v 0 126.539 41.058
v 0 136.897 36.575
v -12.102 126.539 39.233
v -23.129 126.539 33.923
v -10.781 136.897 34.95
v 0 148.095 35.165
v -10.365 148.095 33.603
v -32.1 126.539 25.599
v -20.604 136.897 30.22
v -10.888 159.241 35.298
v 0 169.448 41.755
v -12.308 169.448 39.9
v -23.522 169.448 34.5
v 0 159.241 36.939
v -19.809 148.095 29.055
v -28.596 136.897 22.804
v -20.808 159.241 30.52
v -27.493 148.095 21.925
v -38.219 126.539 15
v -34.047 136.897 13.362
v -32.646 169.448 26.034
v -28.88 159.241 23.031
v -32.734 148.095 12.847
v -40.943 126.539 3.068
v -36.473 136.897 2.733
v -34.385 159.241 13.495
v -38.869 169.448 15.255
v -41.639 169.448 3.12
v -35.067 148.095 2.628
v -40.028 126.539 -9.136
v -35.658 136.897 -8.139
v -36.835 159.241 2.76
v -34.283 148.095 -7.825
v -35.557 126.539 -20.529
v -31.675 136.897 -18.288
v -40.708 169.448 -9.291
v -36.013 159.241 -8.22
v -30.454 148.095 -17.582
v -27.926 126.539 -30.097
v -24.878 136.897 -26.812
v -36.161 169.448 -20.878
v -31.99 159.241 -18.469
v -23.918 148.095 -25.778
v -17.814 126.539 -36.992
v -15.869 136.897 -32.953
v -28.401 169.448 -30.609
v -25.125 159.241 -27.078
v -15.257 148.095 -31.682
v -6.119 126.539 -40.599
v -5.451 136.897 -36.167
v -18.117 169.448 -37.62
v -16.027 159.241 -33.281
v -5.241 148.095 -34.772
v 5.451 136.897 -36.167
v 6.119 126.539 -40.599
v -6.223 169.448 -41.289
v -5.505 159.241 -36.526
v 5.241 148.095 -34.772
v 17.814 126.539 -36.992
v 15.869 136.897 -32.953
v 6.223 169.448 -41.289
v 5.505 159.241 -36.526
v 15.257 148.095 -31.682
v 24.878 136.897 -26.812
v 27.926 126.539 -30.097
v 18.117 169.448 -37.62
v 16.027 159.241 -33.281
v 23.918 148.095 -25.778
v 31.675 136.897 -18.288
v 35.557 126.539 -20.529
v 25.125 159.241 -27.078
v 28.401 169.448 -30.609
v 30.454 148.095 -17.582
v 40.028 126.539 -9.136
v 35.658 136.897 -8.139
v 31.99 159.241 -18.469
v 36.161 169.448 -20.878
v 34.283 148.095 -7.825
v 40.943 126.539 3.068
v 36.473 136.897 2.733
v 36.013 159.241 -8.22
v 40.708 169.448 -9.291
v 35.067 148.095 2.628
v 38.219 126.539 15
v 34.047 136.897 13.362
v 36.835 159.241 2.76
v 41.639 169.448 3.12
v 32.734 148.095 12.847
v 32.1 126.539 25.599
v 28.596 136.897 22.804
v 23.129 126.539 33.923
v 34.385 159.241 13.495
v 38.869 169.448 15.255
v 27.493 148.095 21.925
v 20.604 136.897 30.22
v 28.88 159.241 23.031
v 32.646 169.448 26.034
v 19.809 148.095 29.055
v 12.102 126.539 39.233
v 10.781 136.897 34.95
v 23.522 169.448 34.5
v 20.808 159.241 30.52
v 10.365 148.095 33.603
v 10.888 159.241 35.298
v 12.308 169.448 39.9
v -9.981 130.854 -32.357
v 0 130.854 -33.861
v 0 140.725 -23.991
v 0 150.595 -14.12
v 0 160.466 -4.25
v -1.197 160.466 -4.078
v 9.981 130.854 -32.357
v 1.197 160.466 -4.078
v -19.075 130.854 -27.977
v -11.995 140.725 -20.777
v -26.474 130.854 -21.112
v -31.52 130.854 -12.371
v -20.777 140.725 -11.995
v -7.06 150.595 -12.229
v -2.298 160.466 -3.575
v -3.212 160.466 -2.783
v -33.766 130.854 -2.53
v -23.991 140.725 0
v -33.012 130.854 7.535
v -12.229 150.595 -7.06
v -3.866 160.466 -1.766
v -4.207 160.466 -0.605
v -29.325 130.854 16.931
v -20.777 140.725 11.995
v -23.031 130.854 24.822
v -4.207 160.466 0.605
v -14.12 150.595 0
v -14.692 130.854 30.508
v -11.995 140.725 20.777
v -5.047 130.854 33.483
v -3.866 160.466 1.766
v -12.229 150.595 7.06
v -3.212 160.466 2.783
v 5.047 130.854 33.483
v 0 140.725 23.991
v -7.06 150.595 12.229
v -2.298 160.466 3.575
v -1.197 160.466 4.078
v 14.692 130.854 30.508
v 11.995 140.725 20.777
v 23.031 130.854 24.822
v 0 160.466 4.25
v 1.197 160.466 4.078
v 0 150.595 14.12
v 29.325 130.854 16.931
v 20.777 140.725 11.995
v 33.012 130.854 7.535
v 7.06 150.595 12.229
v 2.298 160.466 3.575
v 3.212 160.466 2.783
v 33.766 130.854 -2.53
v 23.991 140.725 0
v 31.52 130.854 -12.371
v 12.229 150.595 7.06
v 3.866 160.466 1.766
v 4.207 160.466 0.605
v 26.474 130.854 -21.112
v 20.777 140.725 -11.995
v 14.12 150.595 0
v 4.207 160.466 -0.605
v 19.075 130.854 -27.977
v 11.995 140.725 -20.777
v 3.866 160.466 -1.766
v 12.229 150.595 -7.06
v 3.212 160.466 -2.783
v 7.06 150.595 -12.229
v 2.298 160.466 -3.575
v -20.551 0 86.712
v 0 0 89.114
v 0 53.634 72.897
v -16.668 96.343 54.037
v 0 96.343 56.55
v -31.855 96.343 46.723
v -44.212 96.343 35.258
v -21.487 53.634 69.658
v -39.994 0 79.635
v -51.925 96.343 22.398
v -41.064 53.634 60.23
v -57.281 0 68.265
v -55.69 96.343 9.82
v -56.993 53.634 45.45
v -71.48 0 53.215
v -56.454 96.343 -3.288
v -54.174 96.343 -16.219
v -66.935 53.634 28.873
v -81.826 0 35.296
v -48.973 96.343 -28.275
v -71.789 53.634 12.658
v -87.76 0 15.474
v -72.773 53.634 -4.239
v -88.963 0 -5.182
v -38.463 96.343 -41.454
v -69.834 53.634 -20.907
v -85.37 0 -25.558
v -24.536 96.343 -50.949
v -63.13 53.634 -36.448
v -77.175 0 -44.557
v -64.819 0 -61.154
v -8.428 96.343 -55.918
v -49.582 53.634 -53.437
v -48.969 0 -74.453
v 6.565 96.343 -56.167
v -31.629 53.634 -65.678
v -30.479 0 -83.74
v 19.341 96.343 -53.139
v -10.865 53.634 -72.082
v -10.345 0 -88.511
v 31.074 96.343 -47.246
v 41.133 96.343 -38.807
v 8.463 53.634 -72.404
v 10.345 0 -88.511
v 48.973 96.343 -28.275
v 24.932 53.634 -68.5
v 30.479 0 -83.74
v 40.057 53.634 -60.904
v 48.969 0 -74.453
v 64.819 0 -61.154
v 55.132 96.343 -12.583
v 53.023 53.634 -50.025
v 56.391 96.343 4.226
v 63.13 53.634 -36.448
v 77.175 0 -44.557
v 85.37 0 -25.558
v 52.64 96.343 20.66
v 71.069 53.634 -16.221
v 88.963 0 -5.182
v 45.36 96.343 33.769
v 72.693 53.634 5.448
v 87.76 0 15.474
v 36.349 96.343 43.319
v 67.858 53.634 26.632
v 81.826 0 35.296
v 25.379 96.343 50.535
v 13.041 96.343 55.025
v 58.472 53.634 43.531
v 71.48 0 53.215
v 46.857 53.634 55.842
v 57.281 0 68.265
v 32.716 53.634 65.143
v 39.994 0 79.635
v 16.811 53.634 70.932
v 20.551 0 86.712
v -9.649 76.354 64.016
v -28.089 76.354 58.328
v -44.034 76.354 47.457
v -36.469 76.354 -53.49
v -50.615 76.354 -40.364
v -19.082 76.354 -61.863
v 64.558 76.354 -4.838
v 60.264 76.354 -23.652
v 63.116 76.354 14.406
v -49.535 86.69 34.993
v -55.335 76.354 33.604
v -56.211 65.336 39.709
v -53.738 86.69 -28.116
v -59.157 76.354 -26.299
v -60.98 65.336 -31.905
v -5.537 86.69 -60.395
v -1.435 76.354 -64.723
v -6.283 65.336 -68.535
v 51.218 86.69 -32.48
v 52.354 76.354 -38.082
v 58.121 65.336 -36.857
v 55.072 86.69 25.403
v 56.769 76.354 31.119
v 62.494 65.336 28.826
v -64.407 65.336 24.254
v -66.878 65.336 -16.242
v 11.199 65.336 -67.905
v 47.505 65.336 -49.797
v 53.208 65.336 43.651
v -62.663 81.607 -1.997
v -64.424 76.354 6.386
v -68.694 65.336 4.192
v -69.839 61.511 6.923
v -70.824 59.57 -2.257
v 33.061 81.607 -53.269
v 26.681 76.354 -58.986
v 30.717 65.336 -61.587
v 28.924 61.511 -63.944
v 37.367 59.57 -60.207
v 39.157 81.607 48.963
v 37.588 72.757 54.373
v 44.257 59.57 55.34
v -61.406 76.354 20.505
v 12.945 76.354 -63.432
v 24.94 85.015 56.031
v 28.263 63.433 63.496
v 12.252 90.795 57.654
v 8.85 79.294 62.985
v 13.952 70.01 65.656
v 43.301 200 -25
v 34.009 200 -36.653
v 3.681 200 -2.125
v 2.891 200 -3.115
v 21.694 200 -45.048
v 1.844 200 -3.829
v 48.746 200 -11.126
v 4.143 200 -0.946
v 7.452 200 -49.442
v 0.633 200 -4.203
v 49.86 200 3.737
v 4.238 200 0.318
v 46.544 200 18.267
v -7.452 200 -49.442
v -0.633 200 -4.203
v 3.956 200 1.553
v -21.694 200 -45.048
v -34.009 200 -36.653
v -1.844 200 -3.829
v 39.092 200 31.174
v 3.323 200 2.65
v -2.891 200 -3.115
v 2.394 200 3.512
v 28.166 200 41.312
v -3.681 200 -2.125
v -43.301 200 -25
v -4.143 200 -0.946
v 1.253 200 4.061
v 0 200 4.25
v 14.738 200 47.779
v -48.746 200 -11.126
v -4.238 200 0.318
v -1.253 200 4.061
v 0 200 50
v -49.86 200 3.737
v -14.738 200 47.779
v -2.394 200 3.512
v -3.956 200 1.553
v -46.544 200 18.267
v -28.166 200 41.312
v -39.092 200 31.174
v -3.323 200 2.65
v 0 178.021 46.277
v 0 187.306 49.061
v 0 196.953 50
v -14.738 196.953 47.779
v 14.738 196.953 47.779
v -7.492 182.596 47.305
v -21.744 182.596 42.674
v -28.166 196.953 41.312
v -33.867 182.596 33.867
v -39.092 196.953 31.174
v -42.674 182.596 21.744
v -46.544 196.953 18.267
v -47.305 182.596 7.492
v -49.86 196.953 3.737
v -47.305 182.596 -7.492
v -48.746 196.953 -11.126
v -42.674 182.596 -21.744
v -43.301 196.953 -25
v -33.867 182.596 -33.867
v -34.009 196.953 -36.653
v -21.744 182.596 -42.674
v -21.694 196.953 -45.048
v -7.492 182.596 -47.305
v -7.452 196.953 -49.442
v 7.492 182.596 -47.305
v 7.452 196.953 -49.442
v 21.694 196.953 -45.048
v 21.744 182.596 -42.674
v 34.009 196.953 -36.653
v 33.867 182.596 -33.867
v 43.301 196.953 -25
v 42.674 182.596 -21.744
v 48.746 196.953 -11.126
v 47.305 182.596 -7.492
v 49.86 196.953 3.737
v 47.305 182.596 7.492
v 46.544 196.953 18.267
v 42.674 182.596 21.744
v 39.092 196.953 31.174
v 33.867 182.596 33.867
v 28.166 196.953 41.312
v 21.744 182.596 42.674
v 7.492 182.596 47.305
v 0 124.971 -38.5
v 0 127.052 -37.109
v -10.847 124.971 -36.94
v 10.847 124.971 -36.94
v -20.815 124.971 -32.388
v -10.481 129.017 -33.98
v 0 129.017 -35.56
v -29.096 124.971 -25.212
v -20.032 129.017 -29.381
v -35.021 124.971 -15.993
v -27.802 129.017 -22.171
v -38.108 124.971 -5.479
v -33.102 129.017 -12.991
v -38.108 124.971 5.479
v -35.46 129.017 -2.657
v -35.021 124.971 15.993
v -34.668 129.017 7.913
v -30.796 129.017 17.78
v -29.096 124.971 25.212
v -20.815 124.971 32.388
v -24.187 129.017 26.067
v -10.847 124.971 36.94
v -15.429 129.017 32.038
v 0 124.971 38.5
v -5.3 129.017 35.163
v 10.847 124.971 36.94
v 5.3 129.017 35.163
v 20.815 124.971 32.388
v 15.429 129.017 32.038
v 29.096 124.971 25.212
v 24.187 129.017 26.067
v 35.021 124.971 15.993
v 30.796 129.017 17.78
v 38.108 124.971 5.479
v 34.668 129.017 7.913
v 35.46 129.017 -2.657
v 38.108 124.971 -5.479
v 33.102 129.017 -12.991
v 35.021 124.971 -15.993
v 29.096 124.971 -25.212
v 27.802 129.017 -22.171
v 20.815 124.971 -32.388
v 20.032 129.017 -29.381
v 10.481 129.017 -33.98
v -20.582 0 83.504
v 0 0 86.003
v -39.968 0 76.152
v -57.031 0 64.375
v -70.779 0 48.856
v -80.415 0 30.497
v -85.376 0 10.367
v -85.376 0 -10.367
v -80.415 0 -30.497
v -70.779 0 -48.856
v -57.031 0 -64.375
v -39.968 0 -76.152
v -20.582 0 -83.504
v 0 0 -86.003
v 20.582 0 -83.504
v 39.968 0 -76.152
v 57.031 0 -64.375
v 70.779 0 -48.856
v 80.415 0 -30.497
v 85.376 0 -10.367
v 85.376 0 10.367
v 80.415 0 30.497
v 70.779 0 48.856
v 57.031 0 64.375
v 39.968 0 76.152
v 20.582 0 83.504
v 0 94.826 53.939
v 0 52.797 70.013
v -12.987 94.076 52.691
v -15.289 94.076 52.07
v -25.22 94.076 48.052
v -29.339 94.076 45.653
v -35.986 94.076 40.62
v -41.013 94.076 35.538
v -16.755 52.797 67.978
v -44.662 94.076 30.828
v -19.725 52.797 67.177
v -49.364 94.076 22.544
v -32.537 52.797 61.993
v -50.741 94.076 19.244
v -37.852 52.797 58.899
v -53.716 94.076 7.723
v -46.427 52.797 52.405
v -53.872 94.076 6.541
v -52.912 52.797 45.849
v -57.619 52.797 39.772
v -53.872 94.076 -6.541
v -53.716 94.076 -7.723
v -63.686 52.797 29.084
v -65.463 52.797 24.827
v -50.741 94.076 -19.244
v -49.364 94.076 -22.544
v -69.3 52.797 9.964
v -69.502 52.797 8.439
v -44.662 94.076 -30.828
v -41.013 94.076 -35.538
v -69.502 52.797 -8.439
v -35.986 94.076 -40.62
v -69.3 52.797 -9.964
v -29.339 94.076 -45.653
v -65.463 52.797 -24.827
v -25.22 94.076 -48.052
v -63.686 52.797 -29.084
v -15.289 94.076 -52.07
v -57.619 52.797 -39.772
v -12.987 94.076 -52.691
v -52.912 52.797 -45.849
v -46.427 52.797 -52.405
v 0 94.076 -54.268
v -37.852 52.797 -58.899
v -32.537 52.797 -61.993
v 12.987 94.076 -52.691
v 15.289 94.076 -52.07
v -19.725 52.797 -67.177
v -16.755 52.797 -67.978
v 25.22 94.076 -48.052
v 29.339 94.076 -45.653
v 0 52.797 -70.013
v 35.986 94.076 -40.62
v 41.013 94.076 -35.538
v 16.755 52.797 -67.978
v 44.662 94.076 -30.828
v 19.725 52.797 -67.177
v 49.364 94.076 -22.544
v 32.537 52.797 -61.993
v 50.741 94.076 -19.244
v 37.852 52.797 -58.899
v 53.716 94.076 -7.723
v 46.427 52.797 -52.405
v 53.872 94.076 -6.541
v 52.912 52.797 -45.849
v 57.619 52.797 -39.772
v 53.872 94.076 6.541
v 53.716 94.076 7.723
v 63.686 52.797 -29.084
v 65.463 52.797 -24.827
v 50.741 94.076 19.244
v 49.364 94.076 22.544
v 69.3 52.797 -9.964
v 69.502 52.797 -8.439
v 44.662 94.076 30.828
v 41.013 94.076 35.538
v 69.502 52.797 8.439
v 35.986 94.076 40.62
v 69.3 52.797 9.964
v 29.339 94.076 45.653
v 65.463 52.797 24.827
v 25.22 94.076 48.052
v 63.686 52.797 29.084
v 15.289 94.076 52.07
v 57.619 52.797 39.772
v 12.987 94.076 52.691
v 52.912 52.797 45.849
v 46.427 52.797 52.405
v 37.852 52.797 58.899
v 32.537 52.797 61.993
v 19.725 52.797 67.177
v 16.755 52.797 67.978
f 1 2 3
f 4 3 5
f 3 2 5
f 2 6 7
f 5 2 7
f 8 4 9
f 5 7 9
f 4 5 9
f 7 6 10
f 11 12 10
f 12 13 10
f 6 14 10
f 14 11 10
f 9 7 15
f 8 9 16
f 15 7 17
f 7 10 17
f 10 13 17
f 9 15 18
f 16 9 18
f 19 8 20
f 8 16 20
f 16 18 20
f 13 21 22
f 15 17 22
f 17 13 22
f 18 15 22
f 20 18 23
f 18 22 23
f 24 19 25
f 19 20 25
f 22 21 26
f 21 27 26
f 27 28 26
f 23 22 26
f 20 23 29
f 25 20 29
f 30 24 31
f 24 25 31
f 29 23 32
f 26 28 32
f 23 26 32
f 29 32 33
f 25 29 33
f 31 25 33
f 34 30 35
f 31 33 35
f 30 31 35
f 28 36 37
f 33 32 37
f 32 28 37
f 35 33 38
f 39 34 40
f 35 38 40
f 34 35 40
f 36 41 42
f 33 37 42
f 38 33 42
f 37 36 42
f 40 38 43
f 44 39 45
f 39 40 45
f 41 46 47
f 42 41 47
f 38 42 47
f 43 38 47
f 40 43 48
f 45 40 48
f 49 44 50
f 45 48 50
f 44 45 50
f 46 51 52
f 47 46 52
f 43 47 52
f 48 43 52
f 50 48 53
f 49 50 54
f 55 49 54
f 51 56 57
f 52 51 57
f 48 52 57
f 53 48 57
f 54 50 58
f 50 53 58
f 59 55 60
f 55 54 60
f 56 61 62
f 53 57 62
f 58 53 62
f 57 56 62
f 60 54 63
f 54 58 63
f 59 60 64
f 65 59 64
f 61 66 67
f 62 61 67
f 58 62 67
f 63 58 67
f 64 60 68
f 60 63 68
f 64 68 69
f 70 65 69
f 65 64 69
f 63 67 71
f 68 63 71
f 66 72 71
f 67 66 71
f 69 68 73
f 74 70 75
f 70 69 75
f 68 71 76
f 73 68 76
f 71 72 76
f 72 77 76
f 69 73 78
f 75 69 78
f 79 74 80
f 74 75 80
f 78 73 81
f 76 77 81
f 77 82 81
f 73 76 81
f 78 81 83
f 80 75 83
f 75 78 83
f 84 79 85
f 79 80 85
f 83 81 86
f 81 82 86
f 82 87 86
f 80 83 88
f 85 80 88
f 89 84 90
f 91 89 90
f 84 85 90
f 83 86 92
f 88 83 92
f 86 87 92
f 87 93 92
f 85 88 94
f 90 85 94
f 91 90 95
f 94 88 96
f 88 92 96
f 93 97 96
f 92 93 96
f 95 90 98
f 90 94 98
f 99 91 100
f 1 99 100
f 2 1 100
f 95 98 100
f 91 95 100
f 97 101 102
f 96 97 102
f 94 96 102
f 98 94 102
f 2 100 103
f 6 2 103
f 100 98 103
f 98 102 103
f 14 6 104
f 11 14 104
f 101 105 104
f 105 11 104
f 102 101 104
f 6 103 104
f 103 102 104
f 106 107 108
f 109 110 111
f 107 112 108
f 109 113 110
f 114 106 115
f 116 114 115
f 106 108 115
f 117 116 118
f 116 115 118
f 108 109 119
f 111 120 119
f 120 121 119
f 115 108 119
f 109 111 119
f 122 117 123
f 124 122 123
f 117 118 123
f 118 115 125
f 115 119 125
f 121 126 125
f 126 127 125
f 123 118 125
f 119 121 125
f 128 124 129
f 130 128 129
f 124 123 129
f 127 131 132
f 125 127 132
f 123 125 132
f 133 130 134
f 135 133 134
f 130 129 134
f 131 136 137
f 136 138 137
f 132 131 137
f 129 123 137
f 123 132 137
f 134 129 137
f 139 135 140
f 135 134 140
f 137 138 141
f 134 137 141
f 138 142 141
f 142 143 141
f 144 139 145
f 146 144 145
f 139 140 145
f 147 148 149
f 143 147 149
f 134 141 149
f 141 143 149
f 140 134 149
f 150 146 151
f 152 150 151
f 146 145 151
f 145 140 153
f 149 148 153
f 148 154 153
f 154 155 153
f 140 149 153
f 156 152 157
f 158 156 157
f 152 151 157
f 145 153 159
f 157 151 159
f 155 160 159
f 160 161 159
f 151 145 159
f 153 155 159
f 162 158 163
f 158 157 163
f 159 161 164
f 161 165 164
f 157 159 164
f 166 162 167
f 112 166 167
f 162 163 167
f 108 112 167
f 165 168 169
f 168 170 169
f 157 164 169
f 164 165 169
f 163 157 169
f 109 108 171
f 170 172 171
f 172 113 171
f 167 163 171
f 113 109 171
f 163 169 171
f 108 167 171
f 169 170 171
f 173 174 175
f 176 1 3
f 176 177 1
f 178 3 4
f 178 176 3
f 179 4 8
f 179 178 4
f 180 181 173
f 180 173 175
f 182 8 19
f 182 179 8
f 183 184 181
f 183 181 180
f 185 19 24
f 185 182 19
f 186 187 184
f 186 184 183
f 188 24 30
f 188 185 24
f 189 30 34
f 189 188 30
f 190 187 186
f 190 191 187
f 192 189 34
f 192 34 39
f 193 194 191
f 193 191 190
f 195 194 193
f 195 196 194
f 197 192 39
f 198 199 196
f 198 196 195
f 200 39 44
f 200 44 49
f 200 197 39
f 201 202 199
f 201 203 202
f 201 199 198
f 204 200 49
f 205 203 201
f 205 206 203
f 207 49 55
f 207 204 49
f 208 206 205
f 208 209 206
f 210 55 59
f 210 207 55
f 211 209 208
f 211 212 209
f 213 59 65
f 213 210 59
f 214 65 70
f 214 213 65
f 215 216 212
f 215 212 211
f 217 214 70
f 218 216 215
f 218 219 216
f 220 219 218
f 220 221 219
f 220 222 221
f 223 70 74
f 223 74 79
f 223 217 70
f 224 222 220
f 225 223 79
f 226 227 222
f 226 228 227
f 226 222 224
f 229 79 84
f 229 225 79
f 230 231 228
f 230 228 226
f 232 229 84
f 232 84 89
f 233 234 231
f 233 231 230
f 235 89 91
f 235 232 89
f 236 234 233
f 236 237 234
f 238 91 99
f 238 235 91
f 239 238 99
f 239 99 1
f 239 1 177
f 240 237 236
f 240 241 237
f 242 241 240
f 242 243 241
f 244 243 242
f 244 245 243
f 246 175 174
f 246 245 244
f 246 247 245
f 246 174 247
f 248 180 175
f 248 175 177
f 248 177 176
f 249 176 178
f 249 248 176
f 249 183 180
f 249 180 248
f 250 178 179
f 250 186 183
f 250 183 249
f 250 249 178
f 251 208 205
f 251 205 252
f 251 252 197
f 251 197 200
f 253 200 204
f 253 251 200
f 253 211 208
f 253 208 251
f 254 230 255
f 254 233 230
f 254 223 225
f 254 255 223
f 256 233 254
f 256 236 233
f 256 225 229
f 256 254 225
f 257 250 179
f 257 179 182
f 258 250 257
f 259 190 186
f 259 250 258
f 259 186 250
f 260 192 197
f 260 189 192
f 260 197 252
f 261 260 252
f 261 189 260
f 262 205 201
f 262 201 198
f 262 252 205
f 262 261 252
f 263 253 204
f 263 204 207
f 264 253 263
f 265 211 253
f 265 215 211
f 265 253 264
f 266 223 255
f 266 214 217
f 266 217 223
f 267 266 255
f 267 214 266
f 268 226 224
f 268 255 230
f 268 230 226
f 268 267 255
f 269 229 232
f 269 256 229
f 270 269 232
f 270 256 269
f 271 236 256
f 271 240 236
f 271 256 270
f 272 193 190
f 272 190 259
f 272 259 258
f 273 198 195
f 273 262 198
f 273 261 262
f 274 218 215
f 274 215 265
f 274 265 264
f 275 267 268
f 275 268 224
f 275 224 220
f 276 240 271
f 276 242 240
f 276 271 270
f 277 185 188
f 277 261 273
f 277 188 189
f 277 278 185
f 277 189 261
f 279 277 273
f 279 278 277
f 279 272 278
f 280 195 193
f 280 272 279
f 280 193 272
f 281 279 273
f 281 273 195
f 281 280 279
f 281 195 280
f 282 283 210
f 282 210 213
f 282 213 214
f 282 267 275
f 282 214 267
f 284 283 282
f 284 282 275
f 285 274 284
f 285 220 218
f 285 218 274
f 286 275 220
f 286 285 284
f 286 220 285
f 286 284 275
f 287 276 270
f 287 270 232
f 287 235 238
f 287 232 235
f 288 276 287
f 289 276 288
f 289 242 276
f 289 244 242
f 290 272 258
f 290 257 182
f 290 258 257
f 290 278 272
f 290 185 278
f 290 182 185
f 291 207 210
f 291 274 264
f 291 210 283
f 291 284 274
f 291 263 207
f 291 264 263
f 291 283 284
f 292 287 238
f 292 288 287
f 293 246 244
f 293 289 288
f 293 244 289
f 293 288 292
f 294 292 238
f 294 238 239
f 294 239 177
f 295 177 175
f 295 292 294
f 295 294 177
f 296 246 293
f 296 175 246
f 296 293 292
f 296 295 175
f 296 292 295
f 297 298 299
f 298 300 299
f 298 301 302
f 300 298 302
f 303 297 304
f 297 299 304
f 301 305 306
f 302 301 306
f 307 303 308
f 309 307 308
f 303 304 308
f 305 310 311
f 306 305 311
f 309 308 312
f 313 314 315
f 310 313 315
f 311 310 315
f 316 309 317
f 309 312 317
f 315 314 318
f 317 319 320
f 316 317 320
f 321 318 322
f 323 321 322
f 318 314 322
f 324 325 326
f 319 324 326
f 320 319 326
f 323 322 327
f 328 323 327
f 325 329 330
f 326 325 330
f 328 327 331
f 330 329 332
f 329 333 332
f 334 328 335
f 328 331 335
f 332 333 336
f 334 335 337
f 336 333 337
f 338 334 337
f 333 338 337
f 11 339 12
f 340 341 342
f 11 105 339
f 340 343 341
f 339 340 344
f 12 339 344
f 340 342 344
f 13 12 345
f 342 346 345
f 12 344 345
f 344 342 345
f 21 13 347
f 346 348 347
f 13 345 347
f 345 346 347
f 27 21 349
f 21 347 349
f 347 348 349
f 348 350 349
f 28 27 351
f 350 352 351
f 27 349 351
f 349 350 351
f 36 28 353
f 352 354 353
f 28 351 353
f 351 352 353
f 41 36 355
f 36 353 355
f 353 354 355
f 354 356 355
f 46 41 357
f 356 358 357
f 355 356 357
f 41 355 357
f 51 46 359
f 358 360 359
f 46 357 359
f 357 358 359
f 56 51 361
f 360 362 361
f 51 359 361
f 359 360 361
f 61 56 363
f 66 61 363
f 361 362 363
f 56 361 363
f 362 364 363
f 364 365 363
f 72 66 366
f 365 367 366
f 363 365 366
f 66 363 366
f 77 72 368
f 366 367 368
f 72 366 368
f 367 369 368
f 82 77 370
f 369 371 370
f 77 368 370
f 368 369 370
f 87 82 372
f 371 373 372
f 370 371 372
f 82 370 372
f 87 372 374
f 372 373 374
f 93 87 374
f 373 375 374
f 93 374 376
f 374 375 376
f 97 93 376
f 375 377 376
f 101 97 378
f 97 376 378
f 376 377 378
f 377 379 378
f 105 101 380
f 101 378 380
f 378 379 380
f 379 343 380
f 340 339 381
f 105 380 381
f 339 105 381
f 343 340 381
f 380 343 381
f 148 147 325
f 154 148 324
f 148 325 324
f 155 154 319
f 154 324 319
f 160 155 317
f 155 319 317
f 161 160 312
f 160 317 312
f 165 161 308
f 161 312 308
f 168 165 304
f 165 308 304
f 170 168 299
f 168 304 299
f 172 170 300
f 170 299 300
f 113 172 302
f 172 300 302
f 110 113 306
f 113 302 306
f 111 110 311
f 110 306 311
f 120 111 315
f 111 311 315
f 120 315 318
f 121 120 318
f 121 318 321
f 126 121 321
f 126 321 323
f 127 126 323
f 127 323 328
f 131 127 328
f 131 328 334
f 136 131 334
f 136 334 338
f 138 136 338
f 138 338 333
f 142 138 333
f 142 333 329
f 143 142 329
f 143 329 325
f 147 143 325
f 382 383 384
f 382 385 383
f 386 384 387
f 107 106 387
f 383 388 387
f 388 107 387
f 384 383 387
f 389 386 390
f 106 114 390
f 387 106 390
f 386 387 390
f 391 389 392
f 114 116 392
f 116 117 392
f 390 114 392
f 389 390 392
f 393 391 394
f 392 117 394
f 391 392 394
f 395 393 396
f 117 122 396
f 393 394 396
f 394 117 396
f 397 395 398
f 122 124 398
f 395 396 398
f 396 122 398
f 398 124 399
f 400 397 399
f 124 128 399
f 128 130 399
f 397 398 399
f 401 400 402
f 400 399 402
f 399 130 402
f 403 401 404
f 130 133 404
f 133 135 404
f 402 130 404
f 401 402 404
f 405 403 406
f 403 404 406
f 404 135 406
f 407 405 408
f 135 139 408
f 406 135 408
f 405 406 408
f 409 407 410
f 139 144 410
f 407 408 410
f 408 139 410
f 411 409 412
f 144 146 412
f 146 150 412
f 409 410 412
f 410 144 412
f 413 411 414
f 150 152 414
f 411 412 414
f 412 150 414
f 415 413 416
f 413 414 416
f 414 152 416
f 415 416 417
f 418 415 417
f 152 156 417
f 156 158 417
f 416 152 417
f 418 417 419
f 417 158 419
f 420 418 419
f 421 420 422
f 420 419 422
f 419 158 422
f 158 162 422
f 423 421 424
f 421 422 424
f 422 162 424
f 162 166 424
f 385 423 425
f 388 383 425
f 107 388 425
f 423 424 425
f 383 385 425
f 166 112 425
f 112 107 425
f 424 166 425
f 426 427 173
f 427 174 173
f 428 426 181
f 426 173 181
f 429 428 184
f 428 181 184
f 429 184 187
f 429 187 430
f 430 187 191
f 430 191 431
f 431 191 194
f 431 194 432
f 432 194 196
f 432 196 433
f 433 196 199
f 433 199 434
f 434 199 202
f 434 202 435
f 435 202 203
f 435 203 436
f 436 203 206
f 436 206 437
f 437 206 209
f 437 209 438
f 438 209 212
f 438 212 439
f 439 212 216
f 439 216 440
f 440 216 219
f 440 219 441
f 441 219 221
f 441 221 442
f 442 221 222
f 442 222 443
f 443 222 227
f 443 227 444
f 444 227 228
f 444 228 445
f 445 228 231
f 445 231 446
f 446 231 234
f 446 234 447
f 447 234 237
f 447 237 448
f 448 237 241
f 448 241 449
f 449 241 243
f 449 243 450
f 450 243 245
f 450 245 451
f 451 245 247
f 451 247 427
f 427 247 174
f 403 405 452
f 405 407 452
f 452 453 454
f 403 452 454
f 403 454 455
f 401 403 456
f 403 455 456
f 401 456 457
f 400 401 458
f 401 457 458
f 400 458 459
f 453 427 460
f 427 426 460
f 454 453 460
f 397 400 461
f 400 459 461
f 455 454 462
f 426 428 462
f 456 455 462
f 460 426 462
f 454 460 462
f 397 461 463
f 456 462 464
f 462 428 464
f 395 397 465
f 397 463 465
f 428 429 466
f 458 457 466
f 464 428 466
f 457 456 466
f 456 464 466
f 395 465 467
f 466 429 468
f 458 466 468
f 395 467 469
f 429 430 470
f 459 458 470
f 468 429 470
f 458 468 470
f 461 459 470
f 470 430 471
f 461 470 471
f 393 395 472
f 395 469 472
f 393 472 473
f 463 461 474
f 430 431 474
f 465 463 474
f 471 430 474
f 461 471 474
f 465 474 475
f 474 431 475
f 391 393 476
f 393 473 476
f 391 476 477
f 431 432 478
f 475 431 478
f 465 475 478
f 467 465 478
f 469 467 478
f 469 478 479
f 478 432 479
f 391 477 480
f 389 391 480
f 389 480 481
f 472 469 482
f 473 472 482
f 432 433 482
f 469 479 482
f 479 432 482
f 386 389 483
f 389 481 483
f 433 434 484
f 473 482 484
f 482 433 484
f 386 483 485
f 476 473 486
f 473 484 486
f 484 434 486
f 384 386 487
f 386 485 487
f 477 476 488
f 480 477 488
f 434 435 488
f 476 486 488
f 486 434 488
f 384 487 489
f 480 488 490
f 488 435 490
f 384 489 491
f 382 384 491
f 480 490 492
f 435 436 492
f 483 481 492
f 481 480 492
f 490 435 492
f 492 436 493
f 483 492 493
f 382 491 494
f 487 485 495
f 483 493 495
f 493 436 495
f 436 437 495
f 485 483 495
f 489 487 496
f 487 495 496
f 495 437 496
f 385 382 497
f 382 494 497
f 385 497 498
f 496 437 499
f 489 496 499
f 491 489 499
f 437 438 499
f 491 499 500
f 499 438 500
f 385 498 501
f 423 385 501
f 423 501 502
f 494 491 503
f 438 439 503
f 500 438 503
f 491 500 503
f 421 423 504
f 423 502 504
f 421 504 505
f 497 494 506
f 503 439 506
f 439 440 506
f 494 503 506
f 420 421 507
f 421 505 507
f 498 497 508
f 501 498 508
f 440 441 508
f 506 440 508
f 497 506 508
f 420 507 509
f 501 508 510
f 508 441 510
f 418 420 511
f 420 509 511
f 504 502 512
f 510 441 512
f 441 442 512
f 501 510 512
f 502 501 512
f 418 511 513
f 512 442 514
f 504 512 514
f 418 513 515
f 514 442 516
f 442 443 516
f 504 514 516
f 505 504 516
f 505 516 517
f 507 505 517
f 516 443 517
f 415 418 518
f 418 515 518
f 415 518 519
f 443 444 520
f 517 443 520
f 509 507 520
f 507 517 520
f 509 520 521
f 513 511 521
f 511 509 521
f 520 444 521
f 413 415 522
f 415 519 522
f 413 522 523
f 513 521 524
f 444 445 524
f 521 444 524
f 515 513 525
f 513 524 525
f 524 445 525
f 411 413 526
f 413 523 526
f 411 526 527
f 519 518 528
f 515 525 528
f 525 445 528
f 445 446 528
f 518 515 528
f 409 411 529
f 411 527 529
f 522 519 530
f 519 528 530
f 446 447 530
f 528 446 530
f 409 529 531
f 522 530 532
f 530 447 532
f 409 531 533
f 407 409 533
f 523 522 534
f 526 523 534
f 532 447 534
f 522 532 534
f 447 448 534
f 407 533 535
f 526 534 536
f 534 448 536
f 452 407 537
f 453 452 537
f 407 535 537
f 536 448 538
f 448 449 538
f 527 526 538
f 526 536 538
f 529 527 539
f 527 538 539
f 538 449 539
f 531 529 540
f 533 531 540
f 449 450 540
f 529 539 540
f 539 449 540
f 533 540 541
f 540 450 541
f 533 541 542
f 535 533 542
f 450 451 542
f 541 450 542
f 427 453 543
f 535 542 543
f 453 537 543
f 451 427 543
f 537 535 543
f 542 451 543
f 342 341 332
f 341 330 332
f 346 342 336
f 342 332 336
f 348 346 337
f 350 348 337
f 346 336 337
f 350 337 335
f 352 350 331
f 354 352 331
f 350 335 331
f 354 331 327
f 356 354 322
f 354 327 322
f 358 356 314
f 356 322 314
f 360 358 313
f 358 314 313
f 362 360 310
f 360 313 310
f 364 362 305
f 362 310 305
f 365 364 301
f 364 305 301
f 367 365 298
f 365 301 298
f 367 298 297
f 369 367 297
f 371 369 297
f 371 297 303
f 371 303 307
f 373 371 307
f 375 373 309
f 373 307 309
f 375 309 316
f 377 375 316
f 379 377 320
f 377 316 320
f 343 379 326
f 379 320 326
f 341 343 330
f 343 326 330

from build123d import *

# Parameters (mm, degrees)
SKETCH6_R          = 4.25
CUT_EXTRUDE1_DEPTH = 237.394879975


with BuildPart() as part:
    # Sketch2 → Revolve1 (revolve)
    with BuildSketch(Plane(origin=(0, 0, 0), x_dir=(0, 0, -1), z_dir=(1, 0, 0))):
        with BuildLine():
            Line((-47, 200), (-47, 196.952633809))
            ThreePointArc((-47, 196.952633809), (-45.020836212, 183.457289916), (-39.250029499, 171.098520319))
            ThreePointArc((-39.250029499, 171.098520319), (-32.165314943, 148.143950557), (-38.499883067, 124.971149691))
            add(Edge.make_bspline(
                [(-38.499883067, 124.971149691), (-39.004530717, 124.147950453), (-39.989837427, 122.509882381), (-41.987103434, 119.066741734), (-44.476625137, 114.542174666), (-47.469272443, 108.73134572), (-51.458823728, 100.486184281), (-56.445386005, 89.243791761), (-62.422969316, 74.260784727), (-68.39139954, 57.78817126), (-73.355476081, 42.822187789), (-77.320473203, 30.10613441), (-80.290300516, 20.200019419), (-82.763970951, 11.629508828), (-84.647070901, 4.923001543), (-85.564233648, 1.602436154), (-85.985445094, 0.065829354), (-86.003484285, -2.71e-07)],
                knots=[0.502863577, 0.502863577, 0.502863577, 0.502863577, 0.502970965, 0.503078353, 0.503293128, 0.503507904, 0.50372268, 0.504152231, 0.504581782, 0.505011333, 0.505440885, 0.50565566, 0.505870436, 0.506085211, 0.506192599, 0.506280364, 0.506284289, 0.506284289, 0.506284289, 0.506284289], degree=3))
            Line((-86.003484285, -2.71e-07), (-89.113801103, 0))
            add(Edge.make_bspline(
                [(-41.057539829, 126.539075674), (-65.366339288, 86.885695354), (-89.113801103, 0)],
                knots=[0, 0, 0, 1, 1, 1], degree=2))
            ThreePointArc((-41.057539829, 126.539075674), (-35.16491832, 148.095169564), (-41.755350531, 169.448257756))
            ThreePointArc((-41.755350531, 169.448257756), (-47.894506608, 182.595884987), (-50, 196.952633809))
            Line((-50, 196.952633809), (-50, 200))
            Line((-50, 200), (-47, 200))
        make_face()
    revolve(axis=Axis((0, 180, 0), (0, -1, 0)))

    # Sketch5 → Revolve2 (revolve)
    with BuildSketch(Plane(origin=(0, 0, 0), x_dir=(0, 0, -1), z_dir=(1, 0, 0)), mode=Mode.PRIVATE) as revolve2_sk:
        with BuildLine():
            Line((-33.861088957, 130.854414053), (-3, 161.71550301))
            Line((-3, 161.71550301), (0, 161.71550301))
            Line((0, 161.71550301), (0, 200))
            Line((0, 200), (-47, 200))
            Line((-47, 200), (-47, 196.952633809))
            ThreePointArc((-47, 196.952633809), (-45.020836212, 183.457289916), (-39.250029499, 171.098520319))
            ThreePointArc((-39.250029499, 171.098520319), (-32.165314943, 148.143950557), (-38.499883067, 124.971149691))
            ThreePointArc((-38.499883067, 124.971149691), (-36.353838994, 128.049465988), (-33.861088957, 130.854414053))
        make_face()
    revolve(revolve2_sk.sketch.rotate(Axis((0, -1000, 0), (0, 1, 0)), 180), axis=Axis((0, -1000, 0), (0, 1, 0)))

    # Sketch6 → Cut-Extrude1 (cut, through all)
    with BuildSketch(Plane(origin=(0, 200, 0), x_dir=(1, 0, 0), z_dir=(0, 1, 0))):
        with Locations(Location((0, 0, 0), (0, 0, 270))):
            Circle(SKETCH6_R)
    extrude(amount=-CUT_EXTRUDE1_DEPTH, mode=Mode.SUBTRACT)


solid = part.part
